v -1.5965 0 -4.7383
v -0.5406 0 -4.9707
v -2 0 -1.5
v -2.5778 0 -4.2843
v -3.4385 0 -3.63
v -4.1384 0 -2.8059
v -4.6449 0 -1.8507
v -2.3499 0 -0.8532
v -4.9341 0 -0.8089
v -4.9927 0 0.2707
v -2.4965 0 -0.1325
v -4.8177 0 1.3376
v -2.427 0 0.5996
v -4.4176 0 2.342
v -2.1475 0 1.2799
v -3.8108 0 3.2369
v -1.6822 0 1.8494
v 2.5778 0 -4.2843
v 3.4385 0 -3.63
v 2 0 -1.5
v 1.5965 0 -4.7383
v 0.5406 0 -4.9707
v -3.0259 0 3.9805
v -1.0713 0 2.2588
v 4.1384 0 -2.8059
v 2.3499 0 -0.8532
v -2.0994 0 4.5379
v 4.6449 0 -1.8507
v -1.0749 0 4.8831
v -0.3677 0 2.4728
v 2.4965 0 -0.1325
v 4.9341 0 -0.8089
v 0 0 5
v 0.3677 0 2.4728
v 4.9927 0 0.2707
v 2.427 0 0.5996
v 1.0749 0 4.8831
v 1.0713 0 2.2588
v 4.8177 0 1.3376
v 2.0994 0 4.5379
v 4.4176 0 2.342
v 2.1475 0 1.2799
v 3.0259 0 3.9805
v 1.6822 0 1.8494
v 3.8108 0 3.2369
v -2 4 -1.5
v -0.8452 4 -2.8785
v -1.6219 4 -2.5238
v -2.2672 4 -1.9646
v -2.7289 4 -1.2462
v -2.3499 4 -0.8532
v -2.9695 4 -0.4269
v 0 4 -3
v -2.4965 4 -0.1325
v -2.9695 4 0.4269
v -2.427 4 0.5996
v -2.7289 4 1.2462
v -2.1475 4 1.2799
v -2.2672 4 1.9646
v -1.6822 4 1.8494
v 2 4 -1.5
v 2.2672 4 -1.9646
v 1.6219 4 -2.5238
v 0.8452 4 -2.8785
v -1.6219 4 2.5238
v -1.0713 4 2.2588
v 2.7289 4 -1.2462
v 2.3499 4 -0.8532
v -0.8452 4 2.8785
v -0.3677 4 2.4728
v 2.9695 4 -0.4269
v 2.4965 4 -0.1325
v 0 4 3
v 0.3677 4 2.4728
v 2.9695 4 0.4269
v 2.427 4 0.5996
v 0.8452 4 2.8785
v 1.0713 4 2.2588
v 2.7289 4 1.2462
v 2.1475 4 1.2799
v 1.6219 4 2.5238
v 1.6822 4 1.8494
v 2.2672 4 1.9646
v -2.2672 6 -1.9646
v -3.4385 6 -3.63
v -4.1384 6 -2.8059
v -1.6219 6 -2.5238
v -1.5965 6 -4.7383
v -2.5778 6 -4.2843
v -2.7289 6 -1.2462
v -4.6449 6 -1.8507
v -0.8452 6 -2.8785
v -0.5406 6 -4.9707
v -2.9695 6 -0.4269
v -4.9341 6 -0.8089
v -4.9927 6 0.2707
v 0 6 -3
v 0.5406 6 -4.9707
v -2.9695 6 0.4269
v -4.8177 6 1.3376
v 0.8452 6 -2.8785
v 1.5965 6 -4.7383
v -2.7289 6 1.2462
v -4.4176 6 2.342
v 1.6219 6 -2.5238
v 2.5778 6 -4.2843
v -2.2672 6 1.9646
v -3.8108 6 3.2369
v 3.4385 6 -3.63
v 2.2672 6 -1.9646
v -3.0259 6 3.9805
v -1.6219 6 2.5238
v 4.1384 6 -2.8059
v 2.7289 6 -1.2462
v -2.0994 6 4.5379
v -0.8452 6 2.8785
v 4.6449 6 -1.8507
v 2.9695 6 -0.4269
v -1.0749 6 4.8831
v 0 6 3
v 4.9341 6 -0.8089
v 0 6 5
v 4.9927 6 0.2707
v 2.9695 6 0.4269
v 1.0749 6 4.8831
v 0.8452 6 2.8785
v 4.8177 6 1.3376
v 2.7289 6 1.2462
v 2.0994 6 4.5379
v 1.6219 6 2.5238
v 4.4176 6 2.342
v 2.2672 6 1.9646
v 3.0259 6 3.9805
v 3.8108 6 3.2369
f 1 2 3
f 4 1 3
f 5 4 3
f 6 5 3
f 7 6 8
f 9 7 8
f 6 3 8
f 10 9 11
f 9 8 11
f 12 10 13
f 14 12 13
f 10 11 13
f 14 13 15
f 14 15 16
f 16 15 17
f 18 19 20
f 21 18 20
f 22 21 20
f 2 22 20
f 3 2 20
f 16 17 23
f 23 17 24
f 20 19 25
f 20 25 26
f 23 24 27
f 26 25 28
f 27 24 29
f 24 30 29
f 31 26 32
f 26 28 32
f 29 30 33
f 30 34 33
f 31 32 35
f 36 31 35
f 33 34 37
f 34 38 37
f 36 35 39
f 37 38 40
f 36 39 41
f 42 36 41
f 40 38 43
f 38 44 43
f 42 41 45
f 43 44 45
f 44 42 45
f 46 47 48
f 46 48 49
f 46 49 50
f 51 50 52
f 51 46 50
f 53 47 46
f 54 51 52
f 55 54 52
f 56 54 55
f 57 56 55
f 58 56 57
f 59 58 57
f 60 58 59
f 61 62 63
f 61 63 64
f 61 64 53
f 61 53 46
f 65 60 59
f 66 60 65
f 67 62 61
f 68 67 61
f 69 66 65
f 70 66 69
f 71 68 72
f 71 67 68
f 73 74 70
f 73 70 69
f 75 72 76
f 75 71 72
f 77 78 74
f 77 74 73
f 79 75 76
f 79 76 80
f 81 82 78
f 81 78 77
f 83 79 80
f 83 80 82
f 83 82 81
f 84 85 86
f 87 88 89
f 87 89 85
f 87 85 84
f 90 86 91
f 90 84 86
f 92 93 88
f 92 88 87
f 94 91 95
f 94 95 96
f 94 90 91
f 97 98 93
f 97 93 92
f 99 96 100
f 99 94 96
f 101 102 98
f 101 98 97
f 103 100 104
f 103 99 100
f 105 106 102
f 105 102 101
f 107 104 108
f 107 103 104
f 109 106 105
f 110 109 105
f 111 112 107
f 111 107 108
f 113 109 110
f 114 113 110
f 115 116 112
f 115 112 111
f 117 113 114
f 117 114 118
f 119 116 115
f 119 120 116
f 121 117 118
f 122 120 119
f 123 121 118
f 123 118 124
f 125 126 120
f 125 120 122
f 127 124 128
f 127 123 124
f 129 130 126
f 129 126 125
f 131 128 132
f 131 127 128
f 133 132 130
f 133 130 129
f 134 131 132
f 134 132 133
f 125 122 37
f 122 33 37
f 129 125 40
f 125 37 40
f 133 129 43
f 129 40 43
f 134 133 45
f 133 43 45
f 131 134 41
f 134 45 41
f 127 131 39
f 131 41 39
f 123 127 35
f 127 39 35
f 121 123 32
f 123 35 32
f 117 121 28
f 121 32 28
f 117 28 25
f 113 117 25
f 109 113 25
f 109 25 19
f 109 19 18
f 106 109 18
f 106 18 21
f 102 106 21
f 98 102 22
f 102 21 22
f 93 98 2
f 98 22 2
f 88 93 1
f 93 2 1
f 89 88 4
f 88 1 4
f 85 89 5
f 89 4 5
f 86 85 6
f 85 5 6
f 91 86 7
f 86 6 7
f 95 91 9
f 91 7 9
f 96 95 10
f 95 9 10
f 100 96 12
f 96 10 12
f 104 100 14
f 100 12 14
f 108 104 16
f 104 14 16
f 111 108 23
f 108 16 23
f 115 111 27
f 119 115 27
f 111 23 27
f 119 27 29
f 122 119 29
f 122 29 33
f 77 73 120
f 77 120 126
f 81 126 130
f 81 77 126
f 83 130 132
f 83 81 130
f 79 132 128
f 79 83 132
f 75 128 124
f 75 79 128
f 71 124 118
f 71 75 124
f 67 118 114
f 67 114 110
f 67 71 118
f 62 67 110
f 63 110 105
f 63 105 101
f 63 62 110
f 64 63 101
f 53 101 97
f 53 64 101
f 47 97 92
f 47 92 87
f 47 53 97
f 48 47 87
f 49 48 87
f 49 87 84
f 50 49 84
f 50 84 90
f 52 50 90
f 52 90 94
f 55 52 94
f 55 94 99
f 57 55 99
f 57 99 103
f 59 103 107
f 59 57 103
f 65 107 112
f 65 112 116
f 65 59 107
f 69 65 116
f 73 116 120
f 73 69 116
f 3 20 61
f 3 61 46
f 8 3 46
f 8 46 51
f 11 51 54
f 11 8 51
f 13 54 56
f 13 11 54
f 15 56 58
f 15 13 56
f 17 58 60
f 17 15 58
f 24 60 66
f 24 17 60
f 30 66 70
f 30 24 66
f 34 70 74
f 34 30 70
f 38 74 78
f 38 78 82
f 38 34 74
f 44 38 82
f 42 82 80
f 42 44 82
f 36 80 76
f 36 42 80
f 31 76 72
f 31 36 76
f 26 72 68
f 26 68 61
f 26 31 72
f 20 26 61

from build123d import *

# Parameters (mm, degrees)
SKETCH_1_R      = 5
SKETCH_1_R_2    = 3
EXTRUDE_1_DEPTH = 4
EXTRUDE_START   = 4
SKETCH_1_3_R    = 5
SKETCH_1_3_R_2  = 3
EXTRUDE_2_DEPTH = 2


with BuildPart() as part:
    # 草图1 → 凸台-拉伸1 (new body)
    # profile 1 of 2: a face of its own
    with BuildSketch(Plane(origin=(0, 0, 0), x_dir=(1, 0, 0), z_dir=(0, 1, 0))):
        with Locations(Location((0, 0, 0), (0, 0, 270))):
            Circle(SKETCH_1_R)
        with Locations(Location((0, 0, 0), (0, 0, 270))):
            Circle(SKETCH_1_R_2, mode=Mode.SUBTRACT)
    # profile 2 of 2: a face of its own
    with BuildSketch(Plane(origin=(0, 0, 0), x_dir=(1, 0, 0), z_dir=(0, 1, 0))):
        with Locations(Location((0, 0, 0), (0, 0, 270))):
            Circle(SKETCH_1_R_2)
        with BuildLine():
            ThreePointArc((-2, 1.5), (0, -2.5), (2, 1.5))
            Line((2, 1.5), (-2, 1.5))
        make_face(mode=Mode.SUBTRACT)
    extrude(amount=EXTRUDE_1_DEPTH)

    # 草图1<3> → 凸台-拉伸2 (add)
    with BuildSketch(Plane(origin=(0, 0, 0), x_dir=(1, 0, 0), z_dir=(0, 1, 0)).offset(EXTRUDE_START)):
        with Locations(Location((0, 0, 0), (0, 0, 270))):
            Circle(SKETCH_1_3_R)
        with Locations(Location((0, 0, 0), (0, 0, 270))):
            Circle(SKETCH_1_3_R_2, mode=Mode.SUBTRACT)
    extrude(amount=EXTRUDE_2_DEPTH)


solid = part.part
